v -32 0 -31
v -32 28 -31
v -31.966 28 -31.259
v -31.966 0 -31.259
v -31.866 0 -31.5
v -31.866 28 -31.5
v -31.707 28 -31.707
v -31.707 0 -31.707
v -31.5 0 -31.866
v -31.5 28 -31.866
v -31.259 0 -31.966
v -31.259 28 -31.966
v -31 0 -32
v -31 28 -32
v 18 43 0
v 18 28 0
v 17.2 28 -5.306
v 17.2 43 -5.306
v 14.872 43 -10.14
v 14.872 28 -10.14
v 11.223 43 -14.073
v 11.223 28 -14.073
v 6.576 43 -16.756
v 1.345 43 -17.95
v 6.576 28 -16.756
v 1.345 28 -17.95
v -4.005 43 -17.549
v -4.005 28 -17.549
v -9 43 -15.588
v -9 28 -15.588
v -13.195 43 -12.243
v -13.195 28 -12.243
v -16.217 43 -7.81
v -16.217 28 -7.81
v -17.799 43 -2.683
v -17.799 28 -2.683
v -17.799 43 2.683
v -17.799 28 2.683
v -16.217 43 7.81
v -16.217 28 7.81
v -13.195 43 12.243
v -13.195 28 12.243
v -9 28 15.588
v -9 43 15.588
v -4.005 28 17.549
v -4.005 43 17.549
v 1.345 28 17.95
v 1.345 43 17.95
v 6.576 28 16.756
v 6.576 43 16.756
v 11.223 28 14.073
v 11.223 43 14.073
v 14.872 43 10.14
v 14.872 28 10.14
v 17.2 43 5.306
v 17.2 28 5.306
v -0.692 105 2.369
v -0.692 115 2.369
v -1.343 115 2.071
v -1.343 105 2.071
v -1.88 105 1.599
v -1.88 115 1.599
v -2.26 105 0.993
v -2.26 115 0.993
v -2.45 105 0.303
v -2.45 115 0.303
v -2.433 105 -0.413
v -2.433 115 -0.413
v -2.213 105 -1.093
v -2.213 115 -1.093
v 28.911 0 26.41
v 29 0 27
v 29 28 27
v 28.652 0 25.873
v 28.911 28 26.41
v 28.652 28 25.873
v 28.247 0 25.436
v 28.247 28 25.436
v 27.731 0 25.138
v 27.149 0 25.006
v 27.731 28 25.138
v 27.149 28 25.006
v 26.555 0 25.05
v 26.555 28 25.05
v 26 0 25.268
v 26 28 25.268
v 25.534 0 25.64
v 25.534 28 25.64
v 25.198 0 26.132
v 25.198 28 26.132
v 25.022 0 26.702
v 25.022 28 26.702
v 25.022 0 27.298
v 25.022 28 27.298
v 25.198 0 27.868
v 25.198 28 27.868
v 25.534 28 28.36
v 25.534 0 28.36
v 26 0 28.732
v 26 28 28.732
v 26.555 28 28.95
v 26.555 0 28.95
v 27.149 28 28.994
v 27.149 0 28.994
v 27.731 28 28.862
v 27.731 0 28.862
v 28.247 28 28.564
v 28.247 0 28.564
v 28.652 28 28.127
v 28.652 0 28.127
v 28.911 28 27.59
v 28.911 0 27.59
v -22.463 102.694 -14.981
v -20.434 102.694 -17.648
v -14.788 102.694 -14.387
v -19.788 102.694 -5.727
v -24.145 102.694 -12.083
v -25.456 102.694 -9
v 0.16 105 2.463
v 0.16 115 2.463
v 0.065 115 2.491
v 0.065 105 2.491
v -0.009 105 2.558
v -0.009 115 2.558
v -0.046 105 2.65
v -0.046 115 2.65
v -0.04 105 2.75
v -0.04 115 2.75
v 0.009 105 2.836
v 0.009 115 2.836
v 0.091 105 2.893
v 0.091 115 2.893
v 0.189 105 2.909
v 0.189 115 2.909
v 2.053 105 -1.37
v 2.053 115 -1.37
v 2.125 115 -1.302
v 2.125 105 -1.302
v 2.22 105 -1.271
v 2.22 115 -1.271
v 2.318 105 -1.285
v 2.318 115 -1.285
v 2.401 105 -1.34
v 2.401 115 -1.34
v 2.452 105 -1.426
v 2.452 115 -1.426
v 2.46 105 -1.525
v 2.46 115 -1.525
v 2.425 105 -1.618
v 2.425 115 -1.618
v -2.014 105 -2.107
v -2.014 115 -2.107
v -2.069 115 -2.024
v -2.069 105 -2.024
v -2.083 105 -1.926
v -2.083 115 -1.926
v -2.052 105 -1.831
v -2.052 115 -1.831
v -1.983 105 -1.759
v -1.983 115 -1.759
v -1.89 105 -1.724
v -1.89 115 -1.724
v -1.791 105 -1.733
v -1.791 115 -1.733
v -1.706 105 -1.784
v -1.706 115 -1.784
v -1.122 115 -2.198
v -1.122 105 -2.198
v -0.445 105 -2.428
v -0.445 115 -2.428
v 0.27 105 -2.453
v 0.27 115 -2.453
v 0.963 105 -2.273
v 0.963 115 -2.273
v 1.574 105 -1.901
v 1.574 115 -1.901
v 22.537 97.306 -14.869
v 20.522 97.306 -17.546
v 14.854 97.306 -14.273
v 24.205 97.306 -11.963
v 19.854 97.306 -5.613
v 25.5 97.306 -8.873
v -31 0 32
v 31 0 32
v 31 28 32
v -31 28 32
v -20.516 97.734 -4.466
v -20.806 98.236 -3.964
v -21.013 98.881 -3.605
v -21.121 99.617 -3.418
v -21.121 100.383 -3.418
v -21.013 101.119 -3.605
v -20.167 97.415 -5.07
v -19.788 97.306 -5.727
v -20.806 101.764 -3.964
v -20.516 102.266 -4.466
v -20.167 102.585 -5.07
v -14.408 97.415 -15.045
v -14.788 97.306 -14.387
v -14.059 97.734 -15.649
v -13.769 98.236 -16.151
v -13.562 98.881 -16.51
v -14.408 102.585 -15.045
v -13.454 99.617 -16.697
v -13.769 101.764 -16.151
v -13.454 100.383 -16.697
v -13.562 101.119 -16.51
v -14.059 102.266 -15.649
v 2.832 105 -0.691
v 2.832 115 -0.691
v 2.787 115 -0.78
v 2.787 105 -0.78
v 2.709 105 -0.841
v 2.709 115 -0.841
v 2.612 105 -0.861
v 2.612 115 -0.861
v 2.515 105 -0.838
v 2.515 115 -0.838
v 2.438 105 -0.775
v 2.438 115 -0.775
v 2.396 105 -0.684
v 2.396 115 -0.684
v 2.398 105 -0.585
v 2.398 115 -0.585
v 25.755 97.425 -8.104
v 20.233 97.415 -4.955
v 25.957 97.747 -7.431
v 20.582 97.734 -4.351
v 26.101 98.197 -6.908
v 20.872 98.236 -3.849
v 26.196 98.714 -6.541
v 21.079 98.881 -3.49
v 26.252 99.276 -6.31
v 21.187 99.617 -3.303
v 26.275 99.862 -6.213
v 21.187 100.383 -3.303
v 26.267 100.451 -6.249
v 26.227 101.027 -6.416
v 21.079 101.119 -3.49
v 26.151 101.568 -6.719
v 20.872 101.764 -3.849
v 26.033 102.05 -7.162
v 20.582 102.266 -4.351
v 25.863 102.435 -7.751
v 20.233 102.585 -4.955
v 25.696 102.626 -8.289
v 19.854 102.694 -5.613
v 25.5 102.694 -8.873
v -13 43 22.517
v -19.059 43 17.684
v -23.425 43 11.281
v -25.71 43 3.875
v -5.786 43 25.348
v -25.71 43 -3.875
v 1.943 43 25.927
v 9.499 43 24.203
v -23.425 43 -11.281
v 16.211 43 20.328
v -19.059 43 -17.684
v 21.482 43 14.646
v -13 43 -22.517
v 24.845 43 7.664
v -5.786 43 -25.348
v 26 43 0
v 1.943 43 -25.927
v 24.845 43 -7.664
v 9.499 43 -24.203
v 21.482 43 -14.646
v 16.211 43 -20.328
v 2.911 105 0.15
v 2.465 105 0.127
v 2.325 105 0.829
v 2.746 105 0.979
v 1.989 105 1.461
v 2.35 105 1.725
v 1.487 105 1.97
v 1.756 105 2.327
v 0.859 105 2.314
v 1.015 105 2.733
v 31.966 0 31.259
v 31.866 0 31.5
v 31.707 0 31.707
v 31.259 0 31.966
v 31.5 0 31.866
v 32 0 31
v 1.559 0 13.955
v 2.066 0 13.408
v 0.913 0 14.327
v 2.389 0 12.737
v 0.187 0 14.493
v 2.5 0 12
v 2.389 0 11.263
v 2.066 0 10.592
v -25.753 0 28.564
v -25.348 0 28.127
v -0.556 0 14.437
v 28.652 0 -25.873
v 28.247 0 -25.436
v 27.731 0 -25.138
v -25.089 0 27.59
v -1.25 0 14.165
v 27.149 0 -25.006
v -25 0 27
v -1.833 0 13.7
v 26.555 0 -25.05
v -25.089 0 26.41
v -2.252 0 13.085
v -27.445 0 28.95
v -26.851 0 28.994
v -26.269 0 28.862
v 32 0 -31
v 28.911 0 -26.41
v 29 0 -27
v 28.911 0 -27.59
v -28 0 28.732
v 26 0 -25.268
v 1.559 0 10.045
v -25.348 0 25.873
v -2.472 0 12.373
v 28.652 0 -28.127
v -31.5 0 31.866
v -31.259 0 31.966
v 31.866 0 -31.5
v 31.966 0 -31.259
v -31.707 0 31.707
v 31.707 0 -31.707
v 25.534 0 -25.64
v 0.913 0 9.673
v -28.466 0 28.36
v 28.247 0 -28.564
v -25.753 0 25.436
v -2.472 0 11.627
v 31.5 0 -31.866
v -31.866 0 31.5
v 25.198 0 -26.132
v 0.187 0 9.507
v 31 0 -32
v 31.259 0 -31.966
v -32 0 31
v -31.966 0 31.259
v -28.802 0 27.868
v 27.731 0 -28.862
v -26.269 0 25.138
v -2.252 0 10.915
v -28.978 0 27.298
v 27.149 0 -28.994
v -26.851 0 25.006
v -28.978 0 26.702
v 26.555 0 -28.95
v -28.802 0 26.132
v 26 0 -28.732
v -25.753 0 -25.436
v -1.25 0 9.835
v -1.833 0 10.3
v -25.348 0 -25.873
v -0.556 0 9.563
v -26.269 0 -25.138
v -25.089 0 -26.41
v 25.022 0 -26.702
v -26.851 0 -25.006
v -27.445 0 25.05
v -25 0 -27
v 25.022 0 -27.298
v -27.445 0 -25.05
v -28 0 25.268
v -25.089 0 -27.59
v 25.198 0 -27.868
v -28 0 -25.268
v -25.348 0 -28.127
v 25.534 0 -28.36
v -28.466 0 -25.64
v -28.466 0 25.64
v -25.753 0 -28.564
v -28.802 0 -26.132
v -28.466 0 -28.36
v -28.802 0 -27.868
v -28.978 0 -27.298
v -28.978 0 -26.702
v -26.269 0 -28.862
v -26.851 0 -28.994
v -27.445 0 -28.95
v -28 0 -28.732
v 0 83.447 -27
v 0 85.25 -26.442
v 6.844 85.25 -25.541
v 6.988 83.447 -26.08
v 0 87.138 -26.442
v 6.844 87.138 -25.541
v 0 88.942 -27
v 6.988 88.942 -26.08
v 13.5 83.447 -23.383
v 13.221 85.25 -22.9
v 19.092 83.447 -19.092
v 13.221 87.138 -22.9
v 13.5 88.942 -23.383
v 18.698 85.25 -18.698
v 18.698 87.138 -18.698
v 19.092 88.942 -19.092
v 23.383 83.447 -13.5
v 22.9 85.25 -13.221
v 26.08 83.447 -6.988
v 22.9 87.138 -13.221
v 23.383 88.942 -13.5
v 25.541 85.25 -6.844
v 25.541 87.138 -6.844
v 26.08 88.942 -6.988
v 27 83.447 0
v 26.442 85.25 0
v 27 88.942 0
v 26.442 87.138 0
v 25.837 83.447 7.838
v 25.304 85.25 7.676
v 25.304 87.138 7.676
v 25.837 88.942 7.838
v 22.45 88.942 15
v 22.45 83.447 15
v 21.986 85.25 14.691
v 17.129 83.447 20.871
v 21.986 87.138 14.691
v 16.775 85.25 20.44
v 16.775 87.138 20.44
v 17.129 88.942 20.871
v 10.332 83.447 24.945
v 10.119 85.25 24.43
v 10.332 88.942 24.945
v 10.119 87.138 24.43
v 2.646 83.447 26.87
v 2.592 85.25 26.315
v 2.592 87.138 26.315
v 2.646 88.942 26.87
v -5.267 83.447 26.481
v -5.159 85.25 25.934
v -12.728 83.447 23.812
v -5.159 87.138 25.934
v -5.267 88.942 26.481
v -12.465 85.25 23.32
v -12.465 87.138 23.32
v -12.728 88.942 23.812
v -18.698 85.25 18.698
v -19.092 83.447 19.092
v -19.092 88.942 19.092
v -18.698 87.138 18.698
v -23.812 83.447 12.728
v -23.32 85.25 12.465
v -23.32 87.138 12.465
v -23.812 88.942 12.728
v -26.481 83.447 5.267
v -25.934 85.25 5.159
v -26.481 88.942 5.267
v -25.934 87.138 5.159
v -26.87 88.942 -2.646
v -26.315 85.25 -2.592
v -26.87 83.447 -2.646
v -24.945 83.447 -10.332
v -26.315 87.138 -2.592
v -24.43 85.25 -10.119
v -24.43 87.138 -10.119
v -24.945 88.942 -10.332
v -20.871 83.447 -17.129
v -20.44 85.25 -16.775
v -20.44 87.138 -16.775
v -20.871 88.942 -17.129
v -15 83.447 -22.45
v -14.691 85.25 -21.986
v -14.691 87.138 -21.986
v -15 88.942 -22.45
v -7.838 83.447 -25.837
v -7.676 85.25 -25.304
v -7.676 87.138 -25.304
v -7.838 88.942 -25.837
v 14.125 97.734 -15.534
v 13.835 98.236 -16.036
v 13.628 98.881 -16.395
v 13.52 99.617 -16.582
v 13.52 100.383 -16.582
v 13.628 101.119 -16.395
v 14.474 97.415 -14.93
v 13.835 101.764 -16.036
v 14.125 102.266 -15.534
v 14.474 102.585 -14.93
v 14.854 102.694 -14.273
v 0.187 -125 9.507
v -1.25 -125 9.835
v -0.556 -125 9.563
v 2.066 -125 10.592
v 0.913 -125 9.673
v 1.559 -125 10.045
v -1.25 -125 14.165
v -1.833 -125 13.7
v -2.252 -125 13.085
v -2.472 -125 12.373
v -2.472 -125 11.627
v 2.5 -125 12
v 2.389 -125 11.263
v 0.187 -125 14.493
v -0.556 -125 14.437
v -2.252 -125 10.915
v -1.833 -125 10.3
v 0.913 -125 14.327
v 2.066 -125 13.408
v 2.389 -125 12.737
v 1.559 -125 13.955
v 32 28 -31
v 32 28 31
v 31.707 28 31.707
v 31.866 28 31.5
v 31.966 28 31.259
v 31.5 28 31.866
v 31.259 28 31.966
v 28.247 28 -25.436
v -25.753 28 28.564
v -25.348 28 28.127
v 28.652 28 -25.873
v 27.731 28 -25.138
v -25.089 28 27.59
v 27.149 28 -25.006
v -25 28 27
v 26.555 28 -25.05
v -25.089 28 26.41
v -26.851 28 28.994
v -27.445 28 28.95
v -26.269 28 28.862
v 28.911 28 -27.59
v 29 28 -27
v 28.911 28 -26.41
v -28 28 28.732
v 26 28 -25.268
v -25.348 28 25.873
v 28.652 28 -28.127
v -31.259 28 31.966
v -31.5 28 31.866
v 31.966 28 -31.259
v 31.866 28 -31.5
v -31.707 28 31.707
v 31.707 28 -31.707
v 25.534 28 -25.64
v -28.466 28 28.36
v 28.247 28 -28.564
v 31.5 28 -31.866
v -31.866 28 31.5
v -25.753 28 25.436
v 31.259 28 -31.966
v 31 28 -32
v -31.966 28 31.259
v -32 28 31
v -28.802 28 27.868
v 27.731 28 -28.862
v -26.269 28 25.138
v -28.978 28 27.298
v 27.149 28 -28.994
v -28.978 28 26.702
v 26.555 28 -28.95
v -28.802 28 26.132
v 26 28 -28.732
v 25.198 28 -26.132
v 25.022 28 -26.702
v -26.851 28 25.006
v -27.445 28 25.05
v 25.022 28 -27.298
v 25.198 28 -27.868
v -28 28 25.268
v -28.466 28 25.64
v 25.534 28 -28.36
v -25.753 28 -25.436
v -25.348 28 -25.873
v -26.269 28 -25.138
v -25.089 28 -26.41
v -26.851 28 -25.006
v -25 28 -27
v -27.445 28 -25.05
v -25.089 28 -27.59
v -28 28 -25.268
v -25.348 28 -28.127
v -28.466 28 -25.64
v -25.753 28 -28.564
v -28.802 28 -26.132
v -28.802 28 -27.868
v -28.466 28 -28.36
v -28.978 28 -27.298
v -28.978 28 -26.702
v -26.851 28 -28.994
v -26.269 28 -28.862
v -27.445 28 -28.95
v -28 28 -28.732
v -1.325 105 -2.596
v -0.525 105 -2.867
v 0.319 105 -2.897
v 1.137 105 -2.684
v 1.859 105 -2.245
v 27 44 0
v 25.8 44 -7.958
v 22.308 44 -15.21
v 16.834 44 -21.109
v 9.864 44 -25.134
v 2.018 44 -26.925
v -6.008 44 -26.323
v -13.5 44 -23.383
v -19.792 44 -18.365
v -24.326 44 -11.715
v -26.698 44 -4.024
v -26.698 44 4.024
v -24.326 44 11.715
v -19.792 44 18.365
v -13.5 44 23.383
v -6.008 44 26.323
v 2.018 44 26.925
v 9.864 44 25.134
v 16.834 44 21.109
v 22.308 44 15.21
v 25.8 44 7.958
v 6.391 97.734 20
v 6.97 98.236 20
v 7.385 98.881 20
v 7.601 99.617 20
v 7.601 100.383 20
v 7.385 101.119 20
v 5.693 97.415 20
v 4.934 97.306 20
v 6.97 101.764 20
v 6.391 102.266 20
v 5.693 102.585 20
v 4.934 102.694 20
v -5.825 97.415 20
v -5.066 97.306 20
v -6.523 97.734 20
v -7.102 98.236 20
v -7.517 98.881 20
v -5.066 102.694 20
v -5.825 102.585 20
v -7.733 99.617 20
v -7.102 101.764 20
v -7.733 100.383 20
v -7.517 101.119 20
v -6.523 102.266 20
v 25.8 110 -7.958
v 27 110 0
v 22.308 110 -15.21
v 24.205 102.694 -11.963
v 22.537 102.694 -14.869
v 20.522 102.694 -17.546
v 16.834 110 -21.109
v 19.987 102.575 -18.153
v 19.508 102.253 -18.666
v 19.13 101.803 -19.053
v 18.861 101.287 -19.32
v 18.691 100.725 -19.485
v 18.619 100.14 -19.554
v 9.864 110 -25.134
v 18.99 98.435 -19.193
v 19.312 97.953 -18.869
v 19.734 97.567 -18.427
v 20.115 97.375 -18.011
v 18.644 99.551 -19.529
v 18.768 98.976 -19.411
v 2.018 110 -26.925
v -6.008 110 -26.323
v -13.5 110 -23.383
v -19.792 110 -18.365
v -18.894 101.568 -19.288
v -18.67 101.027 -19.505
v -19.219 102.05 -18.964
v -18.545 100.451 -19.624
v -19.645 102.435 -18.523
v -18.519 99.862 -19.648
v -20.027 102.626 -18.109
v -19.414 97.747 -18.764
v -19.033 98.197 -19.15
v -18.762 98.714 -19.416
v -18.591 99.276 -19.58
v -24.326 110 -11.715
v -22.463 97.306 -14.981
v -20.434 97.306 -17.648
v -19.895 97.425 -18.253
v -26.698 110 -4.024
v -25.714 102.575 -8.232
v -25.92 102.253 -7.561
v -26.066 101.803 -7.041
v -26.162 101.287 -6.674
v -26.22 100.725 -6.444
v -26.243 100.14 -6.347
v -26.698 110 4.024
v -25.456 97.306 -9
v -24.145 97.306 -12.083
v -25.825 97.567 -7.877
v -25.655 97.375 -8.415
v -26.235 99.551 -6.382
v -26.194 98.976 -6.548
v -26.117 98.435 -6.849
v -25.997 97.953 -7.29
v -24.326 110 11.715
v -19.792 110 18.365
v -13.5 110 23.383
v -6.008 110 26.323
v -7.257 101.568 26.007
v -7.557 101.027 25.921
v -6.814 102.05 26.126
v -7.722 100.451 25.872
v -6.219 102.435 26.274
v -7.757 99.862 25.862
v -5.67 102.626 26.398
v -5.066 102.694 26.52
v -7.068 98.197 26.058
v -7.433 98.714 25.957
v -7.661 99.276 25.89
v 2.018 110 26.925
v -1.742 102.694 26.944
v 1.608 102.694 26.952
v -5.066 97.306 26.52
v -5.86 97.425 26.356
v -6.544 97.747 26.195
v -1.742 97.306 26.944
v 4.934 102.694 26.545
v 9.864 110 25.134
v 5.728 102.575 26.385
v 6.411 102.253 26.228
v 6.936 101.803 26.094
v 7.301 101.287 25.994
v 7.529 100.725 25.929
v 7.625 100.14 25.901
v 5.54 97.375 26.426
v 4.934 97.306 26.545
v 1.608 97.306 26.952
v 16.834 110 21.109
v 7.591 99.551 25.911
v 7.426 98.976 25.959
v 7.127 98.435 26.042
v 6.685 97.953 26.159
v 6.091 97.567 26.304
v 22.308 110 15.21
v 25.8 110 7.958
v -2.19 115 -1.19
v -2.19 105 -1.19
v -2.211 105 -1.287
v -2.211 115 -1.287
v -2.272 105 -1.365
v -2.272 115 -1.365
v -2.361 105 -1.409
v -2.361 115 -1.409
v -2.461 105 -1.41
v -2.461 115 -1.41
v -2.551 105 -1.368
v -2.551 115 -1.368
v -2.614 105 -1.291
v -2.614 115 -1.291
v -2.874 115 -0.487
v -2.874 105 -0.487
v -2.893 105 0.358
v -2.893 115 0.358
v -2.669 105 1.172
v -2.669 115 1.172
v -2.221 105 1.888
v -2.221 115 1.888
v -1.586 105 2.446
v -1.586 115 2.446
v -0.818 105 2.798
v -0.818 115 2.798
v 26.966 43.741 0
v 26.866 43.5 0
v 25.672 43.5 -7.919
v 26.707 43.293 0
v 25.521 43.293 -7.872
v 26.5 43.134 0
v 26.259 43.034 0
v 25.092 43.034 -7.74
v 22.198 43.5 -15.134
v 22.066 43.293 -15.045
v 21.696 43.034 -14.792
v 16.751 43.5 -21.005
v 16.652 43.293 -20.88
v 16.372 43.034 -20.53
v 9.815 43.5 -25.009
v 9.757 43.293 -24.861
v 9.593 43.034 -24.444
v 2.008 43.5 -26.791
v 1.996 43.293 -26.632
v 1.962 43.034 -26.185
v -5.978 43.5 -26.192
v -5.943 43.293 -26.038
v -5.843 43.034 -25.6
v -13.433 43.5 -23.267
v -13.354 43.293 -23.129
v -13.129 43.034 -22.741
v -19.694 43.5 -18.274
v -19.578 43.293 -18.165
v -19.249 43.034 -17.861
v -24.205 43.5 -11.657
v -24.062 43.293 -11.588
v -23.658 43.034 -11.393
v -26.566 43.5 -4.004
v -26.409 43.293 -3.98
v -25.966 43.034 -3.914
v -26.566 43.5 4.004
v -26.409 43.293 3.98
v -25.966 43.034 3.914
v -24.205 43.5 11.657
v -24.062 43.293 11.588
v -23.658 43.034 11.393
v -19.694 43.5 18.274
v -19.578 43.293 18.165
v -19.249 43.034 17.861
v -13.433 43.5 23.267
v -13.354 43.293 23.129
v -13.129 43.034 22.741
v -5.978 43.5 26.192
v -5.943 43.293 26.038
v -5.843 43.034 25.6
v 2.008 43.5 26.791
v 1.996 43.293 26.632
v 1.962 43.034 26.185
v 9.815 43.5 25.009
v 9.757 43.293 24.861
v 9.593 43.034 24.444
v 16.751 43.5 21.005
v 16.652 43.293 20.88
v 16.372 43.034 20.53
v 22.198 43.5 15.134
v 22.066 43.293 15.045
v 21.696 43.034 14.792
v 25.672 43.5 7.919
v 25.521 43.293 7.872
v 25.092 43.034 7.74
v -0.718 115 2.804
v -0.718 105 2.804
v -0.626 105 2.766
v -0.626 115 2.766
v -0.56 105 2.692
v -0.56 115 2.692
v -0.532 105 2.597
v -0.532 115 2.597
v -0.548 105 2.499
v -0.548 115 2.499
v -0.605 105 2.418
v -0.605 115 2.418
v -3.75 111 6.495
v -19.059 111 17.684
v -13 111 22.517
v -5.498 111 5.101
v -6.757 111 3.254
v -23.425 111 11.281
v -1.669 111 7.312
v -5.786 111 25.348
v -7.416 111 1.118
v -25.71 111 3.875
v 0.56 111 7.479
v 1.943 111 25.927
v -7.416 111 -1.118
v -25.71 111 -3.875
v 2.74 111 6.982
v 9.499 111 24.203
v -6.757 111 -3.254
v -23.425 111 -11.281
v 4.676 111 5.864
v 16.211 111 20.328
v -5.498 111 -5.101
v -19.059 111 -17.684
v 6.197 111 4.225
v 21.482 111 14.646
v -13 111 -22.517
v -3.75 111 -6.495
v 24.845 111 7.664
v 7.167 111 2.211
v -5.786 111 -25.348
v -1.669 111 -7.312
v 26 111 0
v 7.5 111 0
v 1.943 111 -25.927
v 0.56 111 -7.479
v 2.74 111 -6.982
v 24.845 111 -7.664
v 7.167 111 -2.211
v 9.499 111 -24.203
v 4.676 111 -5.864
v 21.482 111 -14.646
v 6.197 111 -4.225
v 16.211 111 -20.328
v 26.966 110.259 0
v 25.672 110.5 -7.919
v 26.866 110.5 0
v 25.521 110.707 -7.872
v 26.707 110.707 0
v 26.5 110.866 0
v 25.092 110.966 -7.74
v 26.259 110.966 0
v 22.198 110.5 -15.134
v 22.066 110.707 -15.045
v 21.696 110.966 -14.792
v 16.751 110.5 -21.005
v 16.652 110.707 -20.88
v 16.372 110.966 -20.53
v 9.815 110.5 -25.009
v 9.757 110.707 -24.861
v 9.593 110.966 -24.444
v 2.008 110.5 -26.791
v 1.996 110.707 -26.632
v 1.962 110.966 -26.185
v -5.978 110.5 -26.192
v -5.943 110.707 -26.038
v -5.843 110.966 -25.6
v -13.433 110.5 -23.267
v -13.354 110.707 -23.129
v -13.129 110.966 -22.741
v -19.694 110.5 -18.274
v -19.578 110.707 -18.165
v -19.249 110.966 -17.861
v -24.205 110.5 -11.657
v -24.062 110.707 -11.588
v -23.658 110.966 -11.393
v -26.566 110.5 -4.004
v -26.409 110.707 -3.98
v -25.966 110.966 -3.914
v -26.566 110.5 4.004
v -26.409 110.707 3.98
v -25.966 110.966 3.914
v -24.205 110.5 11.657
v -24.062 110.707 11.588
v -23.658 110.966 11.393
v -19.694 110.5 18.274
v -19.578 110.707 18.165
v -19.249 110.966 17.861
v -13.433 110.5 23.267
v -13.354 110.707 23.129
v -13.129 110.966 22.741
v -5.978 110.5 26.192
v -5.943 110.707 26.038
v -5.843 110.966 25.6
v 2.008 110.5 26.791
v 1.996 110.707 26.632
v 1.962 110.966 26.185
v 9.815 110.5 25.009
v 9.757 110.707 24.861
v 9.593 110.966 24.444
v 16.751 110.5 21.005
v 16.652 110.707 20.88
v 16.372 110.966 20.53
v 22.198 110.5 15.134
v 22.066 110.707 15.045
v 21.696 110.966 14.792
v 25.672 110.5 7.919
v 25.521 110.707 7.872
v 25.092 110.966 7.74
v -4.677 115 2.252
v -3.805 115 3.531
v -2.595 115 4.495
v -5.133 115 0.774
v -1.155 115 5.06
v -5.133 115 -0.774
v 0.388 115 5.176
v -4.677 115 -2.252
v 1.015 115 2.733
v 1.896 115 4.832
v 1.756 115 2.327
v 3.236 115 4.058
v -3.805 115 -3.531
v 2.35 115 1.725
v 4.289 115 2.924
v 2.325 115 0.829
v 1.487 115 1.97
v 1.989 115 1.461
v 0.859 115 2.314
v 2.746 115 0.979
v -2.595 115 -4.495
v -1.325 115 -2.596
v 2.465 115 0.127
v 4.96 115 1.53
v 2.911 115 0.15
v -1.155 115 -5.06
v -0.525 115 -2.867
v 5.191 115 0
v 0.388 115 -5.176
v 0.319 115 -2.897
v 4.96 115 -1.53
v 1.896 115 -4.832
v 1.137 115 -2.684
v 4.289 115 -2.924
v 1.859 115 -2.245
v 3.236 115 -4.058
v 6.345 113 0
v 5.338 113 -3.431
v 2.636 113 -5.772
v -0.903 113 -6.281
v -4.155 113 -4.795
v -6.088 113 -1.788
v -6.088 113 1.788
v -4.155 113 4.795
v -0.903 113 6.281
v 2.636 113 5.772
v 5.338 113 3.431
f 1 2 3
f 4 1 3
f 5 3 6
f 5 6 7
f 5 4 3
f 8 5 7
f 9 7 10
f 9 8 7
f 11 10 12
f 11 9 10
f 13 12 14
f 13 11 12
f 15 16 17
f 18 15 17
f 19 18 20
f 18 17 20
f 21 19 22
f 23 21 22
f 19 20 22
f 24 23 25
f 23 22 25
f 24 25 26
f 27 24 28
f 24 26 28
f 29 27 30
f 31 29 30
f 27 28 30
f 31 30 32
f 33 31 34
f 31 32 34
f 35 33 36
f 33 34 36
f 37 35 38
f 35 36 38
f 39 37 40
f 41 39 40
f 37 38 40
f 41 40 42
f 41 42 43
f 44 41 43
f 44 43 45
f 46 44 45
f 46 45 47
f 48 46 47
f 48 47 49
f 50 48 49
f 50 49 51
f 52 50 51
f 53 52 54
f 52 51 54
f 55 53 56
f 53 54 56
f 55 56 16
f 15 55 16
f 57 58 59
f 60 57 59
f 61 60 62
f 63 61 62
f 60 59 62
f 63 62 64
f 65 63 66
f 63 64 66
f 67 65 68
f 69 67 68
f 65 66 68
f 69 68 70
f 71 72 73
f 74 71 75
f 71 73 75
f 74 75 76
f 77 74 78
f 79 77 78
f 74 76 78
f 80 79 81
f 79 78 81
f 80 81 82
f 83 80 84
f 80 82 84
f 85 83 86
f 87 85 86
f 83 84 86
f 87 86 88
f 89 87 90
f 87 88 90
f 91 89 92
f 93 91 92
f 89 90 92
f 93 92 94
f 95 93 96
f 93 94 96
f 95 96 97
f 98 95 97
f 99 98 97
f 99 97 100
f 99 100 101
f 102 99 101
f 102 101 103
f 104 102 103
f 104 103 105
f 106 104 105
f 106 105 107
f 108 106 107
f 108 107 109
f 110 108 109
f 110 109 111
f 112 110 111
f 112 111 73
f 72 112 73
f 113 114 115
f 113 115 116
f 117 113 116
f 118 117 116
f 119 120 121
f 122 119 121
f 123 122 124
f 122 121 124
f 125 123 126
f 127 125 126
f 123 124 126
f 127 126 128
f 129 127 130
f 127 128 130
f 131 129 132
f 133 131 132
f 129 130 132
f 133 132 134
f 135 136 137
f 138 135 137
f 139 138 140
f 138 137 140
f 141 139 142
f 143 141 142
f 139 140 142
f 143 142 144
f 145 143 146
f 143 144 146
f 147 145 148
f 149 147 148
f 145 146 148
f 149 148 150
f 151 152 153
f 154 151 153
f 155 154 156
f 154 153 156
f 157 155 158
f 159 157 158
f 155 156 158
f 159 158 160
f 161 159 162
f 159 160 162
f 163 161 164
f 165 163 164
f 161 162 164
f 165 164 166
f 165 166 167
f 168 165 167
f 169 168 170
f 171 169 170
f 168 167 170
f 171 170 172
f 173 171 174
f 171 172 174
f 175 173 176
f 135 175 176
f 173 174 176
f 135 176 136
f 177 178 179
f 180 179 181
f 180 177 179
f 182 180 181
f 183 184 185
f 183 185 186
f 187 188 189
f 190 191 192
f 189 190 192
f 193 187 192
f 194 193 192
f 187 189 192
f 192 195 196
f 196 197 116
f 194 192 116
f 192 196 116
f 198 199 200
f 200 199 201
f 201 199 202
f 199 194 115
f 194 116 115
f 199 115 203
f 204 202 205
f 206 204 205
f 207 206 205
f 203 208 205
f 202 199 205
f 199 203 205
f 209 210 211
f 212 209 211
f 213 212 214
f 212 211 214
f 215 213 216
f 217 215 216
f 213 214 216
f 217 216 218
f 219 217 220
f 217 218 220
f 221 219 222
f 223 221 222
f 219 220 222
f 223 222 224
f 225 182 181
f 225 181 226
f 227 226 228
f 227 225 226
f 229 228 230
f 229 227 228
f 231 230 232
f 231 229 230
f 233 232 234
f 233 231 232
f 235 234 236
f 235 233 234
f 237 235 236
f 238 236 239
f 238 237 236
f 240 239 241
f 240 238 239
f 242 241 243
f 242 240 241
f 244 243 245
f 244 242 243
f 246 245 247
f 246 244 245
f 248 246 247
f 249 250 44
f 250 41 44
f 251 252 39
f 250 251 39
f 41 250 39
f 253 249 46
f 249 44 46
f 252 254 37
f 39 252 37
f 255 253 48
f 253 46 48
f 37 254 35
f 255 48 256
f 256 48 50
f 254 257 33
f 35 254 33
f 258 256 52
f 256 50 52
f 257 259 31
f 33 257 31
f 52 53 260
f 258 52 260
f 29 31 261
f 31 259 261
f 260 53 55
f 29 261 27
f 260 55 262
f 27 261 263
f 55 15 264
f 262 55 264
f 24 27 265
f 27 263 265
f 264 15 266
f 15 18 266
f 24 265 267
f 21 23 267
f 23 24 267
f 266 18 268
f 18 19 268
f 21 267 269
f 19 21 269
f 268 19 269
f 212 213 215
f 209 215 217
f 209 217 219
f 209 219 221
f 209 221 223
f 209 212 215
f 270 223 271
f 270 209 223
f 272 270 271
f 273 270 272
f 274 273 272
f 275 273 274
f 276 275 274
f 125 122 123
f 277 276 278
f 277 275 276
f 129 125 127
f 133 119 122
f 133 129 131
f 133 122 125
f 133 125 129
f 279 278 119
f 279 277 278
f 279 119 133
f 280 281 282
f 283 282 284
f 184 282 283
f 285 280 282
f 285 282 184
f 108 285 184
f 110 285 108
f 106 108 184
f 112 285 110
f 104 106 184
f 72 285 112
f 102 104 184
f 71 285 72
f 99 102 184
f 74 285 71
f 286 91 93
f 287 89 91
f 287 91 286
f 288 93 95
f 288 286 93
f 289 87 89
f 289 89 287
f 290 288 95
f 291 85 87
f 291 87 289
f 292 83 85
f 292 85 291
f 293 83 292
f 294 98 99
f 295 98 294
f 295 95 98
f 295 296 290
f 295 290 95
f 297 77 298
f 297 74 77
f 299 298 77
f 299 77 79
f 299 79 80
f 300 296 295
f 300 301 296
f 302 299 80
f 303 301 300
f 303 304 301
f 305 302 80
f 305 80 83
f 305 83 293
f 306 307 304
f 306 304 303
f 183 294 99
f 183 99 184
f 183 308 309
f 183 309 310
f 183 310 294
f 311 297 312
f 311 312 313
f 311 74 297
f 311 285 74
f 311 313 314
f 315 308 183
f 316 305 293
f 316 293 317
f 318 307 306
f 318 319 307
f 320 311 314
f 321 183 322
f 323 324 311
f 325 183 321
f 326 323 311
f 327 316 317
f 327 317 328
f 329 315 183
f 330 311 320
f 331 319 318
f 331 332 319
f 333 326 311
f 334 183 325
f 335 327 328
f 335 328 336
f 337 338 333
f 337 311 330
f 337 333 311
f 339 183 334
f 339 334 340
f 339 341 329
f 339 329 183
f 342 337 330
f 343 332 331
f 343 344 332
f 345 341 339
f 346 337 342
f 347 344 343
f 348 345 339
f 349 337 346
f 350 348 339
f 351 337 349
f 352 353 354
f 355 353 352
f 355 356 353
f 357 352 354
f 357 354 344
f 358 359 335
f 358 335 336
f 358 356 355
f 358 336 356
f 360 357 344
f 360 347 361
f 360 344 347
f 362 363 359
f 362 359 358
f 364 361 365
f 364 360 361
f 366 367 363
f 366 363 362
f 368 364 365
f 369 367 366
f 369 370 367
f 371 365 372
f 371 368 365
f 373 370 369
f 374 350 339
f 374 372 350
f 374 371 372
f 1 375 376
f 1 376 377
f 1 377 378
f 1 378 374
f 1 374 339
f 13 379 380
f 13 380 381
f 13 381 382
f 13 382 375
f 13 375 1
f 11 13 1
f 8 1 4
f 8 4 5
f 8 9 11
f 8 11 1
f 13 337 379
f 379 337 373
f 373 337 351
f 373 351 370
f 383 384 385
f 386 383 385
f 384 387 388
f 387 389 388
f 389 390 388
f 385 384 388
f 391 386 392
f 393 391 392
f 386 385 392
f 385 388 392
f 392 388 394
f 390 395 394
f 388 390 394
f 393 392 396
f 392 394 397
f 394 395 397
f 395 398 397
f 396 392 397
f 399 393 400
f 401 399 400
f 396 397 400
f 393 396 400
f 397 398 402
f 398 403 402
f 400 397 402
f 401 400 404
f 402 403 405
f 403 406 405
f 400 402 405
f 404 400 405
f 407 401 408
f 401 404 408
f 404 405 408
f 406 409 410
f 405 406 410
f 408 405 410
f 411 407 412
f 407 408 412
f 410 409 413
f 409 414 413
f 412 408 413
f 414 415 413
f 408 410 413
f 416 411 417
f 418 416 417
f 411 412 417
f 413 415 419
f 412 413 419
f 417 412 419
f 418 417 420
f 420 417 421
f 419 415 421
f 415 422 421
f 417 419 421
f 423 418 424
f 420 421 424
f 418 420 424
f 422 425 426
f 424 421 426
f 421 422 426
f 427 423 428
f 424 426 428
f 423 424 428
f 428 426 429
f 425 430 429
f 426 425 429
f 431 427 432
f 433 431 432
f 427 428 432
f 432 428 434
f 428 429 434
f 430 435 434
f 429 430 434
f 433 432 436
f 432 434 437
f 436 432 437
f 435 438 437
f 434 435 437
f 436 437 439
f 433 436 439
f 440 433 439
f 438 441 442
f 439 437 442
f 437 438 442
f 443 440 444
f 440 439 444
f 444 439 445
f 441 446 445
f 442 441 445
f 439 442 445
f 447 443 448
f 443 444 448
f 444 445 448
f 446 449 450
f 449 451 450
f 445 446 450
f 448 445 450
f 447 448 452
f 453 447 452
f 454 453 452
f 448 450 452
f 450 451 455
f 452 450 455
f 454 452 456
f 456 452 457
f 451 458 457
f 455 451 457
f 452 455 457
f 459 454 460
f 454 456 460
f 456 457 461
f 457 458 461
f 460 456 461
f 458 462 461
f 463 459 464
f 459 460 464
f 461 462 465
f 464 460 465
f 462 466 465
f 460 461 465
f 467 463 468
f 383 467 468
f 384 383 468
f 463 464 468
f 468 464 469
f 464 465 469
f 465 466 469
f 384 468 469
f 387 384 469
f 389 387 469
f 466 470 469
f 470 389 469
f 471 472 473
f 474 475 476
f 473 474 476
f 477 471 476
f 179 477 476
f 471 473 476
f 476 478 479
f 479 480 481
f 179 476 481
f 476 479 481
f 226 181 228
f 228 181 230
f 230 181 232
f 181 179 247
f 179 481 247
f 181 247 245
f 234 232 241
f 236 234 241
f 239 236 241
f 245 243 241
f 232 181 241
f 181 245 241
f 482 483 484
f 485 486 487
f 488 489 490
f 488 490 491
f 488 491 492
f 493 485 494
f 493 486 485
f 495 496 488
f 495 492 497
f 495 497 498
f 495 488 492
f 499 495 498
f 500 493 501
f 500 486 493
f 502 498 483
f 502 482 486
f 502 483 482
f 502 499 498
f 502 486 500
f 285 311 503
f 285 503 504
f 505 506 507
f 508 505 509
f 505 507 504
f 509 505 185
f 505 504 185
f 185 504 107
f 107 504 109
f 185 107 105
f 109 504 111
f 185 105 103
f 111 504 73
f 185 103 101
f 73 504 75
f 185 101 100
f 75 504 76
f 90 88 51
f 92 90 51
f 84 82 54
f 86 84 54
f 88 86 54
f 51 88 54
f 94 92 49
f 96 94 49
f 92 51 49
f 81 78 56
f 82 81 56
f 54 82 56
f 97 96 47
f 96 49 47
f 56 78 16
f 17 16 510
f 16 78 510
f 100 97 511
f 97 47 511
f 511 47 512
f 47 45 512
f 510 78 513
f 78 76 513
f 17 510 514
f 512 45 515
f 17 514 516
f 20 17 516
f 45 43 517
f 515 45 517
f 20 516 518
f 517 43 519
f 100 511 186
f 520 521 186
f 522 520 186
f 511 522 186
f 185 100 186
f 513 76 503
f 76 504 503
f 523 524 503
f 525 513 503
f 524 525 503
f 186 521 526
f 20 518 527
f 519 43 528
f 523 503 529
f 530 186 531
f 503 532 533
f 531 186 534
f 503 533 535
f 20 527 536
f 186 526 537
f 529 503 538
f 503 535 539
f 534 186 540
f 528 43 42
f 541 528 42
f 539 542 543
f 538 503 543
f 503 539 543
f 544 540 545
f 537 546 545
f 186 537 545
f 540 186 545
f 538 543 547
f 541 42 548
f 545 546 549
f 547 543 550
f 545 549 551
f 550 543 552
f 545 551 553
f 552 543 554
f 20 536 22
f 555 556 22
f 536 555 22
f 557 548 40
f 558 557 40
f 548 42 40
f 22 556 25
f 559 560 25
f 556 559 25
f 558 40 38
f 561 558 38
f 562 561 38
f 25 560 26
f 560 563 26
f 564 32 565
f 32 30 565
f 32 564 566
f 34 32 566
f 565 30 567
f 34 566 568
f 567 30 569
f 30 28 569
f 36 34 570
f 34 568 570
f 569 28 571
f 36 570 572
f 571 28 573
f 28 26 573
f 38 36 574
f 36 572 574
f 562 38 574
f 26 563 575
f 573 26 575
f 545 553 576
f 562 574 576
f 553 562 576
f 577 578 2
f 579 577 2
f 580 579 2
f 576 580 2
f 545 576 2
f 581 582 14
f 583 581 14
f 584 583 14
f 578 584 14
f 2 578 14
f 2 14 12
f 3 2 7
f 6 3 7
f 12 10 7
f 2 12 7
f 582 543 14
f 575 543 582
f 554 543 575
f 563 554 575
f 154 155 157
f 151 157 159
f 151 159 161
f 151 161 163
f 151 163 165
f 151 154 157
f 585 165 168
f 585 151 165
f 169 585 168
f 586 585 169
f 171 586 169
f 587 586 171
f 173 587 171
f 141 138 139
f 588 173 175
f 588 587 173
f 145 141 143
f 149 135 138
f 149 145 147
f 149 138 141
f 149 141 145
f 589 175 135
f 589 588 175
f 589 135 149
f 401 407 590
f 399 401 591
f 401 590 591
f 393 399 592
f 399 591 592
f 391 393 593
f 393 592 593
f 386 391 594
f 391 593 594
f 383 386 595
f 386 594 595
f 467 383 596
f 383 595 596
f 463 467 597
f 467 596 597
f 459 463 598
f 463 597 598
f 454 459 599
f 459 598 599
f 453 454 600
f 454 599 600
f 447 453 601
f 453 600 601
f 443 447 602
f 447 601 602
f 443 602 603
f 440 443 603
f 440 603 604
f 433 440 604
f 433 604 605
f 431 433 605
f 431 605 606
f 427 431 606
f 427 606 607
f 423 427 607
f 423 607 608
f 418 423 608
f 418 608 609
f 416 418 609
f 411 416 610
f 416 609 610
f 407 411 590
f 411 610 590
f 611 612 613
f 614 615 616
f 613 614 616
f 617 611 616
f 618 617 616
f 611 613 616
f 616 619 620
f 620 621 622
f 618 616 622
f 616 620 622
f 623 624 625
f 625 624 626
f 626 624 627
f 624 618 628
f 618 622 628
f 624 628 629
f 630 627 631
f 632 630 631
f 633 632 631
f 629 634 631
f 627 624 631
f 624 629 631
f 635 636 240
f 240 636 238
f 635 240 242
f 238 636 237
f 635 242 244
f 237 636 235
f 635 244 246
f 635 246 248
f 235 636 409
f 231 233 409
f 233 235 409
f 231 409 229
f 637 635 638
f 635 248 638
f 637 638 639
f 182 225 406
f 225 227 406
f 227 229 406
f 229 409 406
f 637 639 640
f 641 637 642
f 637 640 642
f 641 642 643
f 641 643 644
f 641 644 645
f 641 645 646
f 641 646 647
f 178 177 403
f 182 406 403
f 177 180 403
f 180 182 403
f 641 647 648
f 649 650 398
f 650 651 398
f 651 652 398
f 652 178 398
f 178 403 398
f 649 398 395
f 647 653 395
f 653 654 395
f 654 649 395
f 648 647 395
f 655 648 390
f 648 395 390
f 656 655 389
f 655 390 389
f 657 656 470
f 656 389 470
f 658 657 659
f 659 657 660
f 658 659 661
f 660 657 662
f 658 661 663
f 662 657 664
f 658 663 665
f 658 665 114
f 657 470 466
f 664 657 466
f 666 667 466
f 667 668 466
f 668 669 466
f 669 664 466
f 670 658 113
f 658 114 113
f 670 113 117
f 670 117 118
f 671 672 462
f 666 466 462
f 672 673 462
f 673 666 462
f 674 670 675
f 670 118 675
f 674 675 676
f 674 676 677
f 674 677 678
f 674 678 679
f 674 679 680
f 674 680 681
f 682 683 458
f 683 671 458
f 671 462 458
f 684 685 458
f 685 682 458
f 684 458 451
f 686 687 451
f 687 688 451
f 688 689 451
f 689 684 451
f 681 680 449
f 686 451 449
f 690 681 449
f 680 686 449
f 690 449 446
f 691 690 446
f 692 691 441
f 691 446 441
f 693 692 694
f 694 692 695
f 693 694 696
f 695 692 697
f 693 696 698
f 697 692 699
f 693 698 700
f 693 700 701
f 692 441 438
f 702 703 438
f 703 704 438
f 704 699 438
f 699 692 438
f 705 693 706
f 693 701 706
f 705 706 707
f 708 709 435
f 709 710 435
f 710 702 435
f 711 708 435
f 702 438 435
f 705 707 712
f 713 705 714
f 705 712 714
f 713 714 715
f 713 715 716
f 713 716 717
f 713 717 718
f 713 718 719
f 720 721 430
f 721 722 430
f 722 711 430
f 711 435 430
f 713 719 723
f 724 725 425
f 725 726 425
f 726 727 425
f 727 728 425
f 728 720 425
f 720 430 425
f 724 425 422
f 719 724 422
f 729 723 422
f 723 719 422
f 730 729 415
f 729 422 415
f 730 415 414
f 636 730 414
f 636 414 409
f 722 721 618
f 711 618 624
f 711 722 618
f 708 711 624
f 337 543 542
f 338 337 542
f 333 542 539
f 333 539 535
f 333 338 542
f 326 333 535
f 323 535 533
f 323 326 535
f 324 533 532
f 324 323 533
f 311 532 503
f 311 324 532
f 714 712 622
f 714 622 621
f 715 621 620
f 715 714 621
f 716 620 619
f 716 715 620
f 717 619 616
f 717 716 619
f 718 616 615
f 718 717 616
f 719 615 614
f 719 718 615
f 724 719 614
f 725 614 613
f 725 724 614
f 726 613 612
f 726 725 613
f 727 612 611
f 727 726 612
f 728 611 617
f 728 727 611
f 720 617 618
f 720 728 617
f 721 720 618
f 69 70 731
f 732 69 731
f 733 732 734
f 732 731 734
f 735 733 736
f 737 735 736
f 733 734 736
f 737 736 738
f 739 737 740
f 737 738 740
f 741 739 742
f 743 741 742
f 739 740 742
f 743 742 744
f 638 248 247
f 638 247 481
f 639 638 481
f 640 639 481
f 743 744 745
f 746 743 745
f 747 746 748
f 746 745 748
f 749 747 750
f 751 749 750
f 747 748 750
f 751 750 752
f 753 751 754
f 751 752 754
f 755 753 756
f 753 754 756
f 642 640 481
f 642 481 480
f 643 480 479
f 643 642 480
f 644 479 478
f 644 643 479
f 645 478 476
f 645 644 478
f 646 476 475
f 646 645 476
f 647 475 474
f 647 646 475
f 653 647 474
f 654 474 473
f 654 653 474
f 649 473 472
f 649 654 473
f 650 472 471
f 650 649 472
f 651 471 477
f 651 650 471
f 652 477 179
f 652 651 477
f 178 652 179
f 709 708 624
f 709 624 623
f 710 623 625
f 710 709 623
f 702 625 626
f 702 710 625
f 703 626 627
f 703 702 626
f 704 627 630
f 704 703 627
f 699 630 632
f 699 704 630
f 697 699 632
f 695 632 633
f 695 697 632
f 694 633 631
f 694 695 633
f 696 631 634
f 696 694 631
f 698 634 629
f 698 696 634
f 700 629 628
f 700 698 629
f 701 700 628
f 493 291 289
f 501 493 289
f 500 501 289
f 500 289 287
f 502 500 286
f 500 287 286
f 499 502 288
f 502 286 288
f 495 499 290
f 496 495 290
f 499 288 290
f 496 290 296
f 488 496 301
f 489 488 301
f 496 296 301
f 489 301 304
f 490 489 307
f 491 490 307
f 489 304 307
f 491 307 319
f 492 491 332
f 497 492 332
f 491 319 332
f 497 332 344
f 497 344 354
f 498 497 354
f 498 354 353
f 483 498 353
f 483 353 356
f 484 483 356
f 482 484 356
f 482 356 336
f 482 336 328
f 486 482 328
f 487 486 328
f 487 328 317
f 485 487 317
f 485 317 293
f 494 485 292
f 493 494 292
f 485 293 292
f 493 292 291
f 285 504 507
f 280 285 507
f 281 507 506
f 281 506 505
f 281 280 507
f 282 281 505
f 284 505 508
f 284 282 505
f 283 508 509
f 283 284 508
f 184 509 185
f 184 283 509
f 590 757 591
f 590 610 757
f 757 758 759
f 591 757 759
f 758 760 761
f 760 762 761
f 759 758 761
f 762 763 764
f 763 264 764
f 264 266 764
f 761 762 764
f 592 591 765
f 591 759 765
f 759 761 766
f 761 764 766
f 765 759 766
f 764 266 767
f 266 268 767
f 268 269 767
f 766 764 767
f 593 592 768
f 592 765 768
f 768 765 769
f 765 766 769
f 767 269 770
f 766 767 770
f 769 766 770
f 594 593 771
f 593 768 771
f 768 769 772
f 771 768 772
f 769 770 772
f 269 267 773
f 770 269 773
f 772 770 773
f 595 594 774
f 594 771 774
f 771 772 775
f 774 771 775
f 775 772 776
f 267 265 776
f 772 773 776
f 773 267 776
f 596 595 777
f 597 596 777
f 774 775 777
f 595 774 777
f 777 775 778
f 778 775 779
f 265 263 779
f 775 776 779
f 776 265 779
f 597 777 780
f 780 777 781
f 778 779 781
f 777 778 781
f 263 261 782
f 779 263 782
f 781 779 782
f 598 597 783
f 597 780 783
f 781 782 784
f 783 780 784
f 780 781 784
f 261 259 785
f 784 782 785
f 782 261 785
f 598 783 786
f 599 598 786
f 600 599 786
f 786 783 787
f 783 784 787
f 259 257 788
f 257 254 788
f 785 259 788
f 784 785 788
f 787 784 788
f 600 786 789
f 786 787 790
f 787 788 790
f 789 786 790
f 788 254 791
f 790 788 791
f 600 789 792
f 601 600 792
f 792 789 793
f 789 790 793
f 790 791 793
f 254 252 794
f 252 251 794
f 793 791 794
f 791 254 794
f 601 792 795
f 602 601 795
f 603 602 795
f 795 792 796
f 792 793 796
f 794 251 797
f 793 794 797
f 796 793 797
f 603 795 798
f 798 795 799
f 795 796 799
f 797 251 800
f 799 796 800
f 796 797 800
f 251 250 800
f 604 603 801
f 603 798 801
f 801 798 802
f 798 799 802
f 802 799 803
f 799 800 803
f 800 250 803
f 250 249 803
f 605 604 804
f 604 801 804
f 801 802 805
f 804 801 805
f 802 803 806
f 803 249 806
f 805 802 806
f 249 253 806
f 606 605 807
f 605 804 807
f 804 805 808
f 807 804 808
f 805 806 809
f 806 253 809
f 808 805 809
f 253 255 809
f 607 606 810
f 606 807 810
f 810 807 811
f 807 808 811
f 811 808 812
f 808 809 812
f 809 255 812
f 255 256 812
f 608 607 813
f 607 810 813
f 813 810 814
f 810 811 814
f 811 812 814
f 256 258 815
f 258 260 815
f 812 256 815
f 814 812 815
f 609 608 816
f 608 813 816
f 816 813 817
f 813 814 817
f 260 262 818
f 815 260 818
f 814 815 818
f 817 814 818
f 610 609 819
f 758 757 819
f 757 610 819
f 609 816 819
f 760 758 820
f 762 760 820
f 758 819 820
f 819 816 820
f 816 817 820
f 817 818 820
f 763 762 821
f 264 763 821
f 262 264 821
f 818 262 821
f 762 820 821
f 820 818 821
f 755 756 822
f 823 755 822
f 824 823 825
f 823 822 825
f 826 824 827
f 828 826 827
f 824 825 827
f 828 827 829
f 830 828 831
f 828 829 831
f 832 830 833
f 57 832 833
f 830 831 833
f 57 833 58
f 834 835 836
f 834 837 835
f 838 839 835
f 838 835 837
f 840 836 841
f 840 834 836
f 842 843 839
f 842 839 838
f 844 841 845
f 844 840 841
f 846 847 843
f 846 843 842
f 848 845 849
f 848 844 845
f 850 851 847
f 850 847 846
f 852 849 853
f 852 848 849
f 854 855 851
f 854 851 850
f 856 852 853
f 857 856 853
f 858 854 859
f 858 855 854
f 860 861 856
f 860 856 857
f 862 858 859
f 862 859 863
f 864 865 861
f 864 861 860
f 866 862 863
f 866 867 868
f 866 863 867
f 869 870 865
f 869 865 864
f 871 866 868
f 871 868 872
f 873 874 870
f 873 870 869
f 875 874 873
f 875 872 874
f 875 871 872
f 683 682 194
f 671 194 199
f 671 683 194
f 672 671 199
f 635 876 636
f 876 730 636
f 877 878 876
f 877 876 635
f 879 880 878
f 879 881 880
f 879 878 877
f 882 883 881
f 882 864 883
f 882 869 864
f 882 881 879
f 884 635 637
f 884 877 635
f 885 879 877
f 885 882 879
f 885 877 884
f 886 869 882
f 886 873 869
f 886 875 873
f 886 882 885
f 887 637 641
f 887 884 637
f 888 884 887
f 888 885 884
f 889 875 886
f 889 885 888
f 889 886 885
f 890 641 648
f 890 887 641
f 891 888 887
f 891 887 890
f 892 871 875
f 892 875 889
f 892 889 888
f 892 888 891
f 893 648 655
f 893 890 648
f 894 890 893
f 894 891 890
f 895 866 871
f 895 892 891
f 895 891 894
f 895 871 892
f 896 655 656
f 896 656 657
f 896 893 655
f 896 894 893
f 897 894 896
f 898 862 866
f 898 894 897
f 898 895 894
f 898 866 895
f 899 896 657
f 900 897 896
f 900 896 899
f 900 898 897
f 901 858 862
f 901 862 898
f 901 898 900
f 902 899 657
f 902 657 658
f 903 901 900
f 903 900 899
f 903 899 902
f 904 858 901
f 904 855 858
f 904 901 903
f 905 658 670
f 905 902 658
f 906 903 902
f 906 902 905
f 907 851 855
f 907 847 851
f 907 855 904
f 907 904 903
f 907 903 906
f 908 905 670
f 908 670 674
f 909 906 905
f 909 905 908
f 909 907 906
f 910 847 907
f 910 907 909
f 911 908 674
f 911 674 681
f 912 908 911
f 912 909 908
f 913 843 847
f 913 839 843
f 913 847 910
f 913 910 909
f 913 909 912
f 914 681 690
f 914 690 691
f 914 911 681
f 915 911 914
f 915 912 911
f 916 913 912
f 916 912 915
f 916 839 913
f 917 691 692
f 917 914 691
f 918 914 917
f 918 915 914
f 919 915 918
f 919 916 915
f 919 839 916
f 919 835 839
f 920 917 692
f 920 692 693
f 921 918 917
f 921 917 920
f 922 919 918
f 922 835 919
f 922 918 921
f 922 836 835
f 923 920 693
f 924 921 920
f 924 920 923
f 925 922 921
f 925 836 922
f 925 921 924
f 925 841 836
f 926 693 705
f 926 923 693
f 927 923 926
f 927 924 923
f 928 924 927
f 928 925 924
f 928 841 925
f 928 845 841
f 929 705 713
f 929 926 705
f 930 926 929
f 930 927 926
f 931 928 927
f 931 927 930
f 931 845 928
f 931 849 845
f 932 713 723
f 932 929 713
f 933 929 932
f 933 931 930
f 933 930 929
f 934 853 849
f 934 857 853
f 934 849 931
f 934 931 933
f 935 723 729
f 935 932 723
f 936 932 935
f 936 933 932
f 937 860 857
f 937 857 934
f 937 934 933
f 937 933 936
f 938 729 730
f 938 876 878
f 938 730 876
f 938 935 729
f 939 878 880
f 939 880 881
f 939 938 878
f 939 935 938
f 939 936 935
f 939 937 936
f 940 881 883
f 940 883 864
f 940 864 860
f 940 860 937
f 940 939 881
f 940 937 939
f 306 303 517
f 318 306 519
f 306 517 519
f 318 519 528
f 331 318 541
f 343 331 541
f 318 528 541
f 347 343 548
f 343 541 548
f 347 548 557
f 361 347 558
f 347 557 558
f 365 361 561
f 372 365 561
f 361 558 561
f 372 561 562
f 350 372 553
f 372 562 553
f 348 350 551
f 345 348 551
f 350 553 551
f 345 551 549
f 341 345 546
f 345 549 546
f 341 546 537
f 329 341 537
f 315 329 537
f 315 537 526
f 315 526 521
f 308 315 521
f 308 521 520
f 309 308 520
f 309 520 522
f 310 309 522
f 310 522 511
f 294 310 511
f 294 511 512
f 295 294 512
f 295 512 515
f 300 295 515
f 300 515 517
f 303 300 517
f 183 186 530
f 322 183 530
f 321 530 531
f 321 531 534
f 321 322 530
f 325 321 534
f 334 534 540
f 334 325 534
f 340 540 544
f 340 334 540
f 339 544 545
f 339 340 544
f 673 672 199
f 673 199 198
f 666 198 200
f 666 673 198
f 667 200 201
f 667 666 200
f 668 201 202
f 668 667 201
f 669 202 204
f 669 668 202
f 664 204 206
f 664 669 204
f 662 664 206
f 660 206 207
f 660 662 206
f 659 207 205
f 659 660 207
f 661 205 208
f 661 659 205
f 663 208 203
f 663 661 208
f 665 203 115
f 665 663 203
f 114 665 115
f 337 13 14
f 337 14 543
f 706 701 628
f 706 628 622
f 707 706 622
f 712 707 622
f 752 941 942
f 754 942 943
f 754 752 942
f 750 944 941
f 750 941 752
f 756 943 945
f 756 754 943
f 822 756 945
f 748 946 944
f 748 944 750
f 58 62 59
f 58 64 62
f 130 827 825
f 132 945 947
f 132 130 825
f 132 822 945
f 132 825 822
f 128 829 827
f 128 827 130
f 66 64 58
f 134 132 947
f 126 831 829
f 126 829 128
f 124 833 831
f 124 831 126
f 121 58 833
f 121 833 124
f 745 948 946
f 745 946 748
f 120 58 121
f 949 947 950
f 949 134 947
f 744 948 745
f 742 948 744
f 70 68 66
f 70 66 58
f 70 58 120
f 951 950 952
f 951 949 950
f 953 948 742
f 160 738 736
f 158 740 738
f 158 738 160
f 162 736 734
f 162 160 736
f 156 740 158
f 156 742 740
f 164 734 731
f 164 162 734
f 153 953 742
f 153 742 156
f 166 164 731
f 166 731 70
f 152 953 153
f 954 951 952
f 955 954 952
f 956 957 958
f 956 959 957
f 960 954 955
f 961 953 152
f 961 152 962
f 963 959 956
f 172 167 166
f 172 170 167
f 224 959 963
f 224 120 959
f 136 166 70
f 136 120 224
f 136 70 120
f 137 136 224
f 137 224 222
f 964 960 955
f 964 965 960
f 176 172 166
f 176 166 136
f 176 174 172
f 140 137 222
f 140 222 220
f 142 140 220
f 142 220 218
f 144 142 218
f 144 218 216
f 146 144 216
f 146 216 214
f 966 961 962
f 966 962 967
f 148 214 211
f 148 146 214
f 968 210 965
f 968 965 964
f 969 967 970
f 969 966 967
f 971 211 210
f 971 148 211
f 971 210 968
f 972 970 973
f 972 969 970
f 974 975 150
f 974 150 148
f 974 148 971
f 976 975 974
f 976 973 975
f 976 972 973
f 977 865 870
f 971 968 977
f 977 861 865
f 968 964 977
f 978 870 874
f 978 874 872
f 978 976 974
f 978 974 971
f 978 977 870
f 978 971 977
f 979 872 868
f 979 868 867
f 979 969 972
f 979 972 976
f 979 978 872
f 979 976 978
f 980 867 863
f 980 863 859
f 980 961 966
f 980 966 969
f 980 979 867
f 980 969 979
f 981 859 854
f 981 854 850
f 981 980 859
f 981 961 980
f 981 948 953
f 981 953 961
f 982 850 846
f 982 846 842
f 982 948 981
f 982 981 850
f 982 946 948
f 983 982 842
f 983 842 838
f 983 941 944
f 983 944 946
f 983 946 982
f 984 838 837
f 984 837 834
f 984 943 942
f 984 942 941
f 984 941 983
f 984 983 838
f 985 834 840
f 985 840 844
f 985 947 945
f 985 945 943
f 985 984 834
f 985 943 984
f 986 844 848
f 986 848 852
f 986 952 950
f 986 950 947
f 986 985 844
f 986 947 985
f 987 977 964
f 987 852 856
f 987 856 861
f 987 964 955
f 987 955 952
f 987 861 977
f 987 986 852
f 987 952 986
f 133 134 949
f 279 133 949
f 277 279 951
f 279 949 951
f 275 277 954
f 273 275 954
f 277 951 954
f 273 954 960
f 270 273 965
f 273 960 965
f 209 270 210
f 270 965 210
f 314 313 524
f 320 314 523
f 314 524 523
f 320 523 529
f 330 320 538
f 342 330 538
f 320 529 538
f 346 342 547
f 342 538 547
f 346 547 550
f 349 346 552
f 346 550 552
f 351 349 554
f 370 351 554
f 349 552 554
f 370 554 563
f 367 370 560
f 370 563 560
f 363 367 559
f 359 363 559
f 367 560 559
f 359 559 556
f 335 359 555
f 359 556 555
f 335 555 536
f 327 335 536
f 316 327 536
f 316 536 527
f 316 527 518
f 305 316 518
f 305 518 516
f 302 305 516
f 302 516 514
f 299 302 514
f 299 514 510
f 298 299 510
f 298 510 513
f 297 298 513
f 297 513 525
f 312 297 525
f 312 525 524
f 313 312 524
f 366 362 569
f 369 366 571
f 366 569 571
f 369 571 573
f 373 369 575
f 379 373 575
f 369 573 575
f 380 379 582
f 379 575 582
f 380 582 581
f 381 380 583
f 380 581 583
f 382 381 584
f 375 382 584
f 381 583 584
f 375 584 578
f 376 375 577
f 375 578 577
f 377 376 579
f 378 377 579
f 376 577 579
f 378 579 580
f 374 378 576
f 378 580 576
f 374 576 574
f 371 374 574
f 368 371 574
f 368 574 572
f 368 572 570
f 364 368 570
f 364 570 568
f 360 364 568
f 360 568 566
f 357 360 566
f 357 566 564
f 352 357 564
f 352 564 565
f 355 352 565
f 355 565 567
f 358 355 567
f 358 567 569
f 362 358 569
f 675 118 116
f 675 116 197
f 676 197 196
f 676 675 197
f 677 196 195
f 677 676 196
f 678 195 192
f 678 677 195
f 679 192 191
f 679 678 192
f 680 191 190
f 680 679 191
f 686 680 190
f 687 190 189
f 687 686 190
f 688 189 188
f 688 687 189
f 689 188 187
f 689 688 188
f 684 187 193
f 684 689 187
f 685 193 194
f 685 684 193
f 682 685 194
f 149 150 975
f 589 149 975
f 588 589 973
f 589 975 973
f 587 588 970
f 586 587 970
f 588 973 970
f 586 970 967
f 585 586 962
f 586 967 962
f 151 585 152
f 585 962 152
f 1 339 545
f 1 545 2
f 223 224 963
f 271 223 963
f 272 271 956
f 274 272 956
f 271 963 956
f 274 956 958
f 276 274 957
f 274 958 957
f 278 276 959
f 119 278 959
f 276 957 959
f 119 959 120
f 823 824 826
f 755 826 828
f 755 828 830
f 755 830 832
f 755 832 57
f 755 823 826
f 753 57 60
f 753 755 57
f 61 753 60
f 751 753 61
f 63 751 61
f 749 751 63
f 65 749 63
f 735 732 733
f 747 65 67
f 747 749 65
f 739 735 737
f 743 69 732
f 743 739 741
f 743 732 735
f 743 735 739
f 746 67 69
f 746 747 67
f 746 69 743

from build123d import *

# Parameters (mm, degrees)
BOSS_EXTRUDE1_DEPTH = 28
SKETCH2_R           = 18
BOSS_EXTRUDE2_DEPTH = 15
SKETCH3_R           = 27
BOSS_EXTRUDE3_DEPTH = 68
FILLET1_R           = 1
FILLET2_R           = 1
SKETCH4_R           = 2
CUT_EXTRUDE1_DEPTH  = 29
SKETCH5_R           = 2.5
BOSS_EXTRUDE4_DEPTH = 125
SKETCH7_R           = 7.5
BOSS_EXTRUDE5_DEPTH = 4
BOSS_EXTRUDE5_TAPER = 30
CUT_EXTRUDE2_DEPTH  = 10
CIRPATTERN1_COUNT   = 3
CUT_EXTRUDE3_DEPTH  = 10
CIRPATTERN2_COUNT   = 3


with BuildPart() as part:
    # Sketch1 → Boss-Extrude1 (new body)
    with BuildSketch(Plane(origin=(0, 0, 0), x_dir=(1, 0, 0), z_dir=(0, 1, 0))):
        with BuildLine():
            Line((-31, 32), (31, 32))
            ThreePointArc((31, 32), (31.707106781, 31.707106781), (32, 31))
            Line((32, 31), (32, -31))
            ThreePointArc((32, -31), (31.707106781, -31.707106781), (31, -32))
            Line((31, -32), (-31, -32))
            ThreePointArc((-31, -32), (-31.707106781, -31.707106781), (-32, -31))
            Line((-32, -31), (-32, 31))
            ThreePointArc((-32, 31), (-31.707106781, 31.707106781), (-31, 32))
        make_face()
    extrude(amount=BOSS_EXTRUDE1_DEPTH)

    # Sketch2 → Boss-Extrude2 (add)
    with BuildSketch(Plane(origin=(0, 28, 0), x_dir=(1, 0, 0), z_dir=(0, 1, 0))):
        Circle(SKETCH2_R)
    extrude(amount=BOSS_EXTRUDE2_DEPTH)

    # Sketch3 → Boss-Extrude3 (add)
    with BuildSketch(Plane(origin=(0, 43, 0), x_dir=(1, 0, 0), z_dir=(0, 1, 0))):
        Circle(SKETCH3_R)
    extrude(amount=BOSS_EXTRUDE3_DEPTH)

    # Fillet1
    fillet1_edges = [part.edges().sort_by_distance(p)[0] for p in [
        (-27, 43, 0),
    ]]
    fillet(fillet1_edges, radius=FILLET1_R)

    # Fillet2
    fillet2_edges = [part.edges().sort_by_distance(p)[0] for p in [
        (-27, 111, 0),
    ]]
    fillet(fillet2_edges, radius=FILLET2_R)

    # Sketch4 → Cut-Extrude1 (cut, through all)
    with BuildSketch(Plane(origin=(0, 28, 0), x_dir=(1, 0, 0), z_dir=(0, 1, 0))):
        with Locations((-27, 27)):
            Circle(SKETCH4_R)
        with Locations((27, 27)):
            Circle(SKETCH4_R)
        with Locations((27, -27)):
            Circle(SKETCH4_R)
        with Locations((-27, -27)):
            Circle(SKETCH4_R)
    extrude(amount=-CUT_EXTRUDE1_DEPTH, mode=Mode.SUBTRACT)

    # Sketch5 → Boss-Extrude4 (add)
    with BuildSketch(Plane.XZ):
        with Locations((0, 12)):
            Circle(SKETCH5_R)
    extrude(amount=BOSS_EXTRUDE4_DEPTH)

    # Sketch6 → Cut-Revolve1 (revolve, cut)
    with BuildSketch(Plane(origin=(0, 0, 0), x_dir=(0, 0, -1), z_dir=(1, 0, 0))):
        with BuildLine():
            Line((27, 88.942293347), (27, 83.446507899))
            ThreePointArc((27, 83.446507899), (26.371517202, 86.194400623), (27, 88.942293347))
        make_face()
    revolve(axis=Axis((0, 111, 0), (0, -1, 0)), mode=Mode.SUBTRACT)

    # Sketch7 → Boss-Extrude5 (add)
    with BuildSketch(Plane(origin=(0, 111, 0), x_dir=(1, 0, 0), z_dir=(0, 1, 0))):
        Circle(SKETCH7_R)
    extrude(amount=BOSS_EXTRUDE5_DEPTH, taper=BOSS_EXTRUDE5_TAPER)

    # Sketch8 → Cut-Extrude2 (cut)
    with BuildSketch(Plane.XY.offset(30)):
        with BuildLine():
            Line((-5.065984647, 102.694191022), (4.934015353, 102.694191022))
            ThreePointArc((4.934015353, 102.694191022), (7.628206376, 100), (4.934015353, 97.305808978))
            Line((4.934015353, 97.305808978), (-5.065984647, 97.305808978))
            ThreePointArc((-5.065984647, 97.305808978), (-7.760175669, 100), (-5.065984647, 102.694191022))
        make_face()
    cut_extrude2 = extrude(amount=-CUT_EXTRUDE2_DEPTH, mode=Mode.SUBTRACT)

    # CirPattern1: Cut-Extrude2 ×3 about axis
    cirpattern1_axis = Axis((0, 0, 0), (0, 1, 0))
    for i in range(1, CIRPATTERN1_COUNT):
        add(cut_extrude2.rotate(cirpattern1_axis, i * 360 / CIRPATTERN1_COUNT), mode=Mode.SUBTRACT)

    # Sketch9 → Cut-Extrude3 (cut)
    with BuildSketch(Plane(origin=(0, 115, 0), x_dir=(1, 0, 0), z_dir=(0, 1, 0))):
        with BuildLine():
            ThreePointArc((2.424806001, 1.617896807), (0.319254394, 2.897473184), (-2.014380463, 2.107022917))
            ThreePointArc((-2.014380463, 2.107022917), (-2.021480856, 1.791146289), (-1.705604229, 1.784045896))
            ThreePointArc((-1.705604229, 1.784045896), (0.270317179, 2.453331239), (2.053117296, 1.36989595))
            ThreePointArc((2.053117296, 1.36989595), (2.362962077, 1.308052026), (2.424806001, 1.617896807))
        make_face()
    cut_extrude3 = extrude(amount=-CUT_EXTRUDE3_DEPTH, mode=Mode.SUBTRACT)

    # CirPattern2: Cut-Extrude3 ×3 about axis
    cirpattern2_axis = Axis((0, 0, 0), (0, 1, 0))
    for i in range(1, CIRPATTERN2_COUNT):
        add(cut_extrude3.rotate(cirpattern2_axis, i * 360 / CIRPATTERN2_COUNT), mode=Mode.SUBTRACT)


solid = part.part
